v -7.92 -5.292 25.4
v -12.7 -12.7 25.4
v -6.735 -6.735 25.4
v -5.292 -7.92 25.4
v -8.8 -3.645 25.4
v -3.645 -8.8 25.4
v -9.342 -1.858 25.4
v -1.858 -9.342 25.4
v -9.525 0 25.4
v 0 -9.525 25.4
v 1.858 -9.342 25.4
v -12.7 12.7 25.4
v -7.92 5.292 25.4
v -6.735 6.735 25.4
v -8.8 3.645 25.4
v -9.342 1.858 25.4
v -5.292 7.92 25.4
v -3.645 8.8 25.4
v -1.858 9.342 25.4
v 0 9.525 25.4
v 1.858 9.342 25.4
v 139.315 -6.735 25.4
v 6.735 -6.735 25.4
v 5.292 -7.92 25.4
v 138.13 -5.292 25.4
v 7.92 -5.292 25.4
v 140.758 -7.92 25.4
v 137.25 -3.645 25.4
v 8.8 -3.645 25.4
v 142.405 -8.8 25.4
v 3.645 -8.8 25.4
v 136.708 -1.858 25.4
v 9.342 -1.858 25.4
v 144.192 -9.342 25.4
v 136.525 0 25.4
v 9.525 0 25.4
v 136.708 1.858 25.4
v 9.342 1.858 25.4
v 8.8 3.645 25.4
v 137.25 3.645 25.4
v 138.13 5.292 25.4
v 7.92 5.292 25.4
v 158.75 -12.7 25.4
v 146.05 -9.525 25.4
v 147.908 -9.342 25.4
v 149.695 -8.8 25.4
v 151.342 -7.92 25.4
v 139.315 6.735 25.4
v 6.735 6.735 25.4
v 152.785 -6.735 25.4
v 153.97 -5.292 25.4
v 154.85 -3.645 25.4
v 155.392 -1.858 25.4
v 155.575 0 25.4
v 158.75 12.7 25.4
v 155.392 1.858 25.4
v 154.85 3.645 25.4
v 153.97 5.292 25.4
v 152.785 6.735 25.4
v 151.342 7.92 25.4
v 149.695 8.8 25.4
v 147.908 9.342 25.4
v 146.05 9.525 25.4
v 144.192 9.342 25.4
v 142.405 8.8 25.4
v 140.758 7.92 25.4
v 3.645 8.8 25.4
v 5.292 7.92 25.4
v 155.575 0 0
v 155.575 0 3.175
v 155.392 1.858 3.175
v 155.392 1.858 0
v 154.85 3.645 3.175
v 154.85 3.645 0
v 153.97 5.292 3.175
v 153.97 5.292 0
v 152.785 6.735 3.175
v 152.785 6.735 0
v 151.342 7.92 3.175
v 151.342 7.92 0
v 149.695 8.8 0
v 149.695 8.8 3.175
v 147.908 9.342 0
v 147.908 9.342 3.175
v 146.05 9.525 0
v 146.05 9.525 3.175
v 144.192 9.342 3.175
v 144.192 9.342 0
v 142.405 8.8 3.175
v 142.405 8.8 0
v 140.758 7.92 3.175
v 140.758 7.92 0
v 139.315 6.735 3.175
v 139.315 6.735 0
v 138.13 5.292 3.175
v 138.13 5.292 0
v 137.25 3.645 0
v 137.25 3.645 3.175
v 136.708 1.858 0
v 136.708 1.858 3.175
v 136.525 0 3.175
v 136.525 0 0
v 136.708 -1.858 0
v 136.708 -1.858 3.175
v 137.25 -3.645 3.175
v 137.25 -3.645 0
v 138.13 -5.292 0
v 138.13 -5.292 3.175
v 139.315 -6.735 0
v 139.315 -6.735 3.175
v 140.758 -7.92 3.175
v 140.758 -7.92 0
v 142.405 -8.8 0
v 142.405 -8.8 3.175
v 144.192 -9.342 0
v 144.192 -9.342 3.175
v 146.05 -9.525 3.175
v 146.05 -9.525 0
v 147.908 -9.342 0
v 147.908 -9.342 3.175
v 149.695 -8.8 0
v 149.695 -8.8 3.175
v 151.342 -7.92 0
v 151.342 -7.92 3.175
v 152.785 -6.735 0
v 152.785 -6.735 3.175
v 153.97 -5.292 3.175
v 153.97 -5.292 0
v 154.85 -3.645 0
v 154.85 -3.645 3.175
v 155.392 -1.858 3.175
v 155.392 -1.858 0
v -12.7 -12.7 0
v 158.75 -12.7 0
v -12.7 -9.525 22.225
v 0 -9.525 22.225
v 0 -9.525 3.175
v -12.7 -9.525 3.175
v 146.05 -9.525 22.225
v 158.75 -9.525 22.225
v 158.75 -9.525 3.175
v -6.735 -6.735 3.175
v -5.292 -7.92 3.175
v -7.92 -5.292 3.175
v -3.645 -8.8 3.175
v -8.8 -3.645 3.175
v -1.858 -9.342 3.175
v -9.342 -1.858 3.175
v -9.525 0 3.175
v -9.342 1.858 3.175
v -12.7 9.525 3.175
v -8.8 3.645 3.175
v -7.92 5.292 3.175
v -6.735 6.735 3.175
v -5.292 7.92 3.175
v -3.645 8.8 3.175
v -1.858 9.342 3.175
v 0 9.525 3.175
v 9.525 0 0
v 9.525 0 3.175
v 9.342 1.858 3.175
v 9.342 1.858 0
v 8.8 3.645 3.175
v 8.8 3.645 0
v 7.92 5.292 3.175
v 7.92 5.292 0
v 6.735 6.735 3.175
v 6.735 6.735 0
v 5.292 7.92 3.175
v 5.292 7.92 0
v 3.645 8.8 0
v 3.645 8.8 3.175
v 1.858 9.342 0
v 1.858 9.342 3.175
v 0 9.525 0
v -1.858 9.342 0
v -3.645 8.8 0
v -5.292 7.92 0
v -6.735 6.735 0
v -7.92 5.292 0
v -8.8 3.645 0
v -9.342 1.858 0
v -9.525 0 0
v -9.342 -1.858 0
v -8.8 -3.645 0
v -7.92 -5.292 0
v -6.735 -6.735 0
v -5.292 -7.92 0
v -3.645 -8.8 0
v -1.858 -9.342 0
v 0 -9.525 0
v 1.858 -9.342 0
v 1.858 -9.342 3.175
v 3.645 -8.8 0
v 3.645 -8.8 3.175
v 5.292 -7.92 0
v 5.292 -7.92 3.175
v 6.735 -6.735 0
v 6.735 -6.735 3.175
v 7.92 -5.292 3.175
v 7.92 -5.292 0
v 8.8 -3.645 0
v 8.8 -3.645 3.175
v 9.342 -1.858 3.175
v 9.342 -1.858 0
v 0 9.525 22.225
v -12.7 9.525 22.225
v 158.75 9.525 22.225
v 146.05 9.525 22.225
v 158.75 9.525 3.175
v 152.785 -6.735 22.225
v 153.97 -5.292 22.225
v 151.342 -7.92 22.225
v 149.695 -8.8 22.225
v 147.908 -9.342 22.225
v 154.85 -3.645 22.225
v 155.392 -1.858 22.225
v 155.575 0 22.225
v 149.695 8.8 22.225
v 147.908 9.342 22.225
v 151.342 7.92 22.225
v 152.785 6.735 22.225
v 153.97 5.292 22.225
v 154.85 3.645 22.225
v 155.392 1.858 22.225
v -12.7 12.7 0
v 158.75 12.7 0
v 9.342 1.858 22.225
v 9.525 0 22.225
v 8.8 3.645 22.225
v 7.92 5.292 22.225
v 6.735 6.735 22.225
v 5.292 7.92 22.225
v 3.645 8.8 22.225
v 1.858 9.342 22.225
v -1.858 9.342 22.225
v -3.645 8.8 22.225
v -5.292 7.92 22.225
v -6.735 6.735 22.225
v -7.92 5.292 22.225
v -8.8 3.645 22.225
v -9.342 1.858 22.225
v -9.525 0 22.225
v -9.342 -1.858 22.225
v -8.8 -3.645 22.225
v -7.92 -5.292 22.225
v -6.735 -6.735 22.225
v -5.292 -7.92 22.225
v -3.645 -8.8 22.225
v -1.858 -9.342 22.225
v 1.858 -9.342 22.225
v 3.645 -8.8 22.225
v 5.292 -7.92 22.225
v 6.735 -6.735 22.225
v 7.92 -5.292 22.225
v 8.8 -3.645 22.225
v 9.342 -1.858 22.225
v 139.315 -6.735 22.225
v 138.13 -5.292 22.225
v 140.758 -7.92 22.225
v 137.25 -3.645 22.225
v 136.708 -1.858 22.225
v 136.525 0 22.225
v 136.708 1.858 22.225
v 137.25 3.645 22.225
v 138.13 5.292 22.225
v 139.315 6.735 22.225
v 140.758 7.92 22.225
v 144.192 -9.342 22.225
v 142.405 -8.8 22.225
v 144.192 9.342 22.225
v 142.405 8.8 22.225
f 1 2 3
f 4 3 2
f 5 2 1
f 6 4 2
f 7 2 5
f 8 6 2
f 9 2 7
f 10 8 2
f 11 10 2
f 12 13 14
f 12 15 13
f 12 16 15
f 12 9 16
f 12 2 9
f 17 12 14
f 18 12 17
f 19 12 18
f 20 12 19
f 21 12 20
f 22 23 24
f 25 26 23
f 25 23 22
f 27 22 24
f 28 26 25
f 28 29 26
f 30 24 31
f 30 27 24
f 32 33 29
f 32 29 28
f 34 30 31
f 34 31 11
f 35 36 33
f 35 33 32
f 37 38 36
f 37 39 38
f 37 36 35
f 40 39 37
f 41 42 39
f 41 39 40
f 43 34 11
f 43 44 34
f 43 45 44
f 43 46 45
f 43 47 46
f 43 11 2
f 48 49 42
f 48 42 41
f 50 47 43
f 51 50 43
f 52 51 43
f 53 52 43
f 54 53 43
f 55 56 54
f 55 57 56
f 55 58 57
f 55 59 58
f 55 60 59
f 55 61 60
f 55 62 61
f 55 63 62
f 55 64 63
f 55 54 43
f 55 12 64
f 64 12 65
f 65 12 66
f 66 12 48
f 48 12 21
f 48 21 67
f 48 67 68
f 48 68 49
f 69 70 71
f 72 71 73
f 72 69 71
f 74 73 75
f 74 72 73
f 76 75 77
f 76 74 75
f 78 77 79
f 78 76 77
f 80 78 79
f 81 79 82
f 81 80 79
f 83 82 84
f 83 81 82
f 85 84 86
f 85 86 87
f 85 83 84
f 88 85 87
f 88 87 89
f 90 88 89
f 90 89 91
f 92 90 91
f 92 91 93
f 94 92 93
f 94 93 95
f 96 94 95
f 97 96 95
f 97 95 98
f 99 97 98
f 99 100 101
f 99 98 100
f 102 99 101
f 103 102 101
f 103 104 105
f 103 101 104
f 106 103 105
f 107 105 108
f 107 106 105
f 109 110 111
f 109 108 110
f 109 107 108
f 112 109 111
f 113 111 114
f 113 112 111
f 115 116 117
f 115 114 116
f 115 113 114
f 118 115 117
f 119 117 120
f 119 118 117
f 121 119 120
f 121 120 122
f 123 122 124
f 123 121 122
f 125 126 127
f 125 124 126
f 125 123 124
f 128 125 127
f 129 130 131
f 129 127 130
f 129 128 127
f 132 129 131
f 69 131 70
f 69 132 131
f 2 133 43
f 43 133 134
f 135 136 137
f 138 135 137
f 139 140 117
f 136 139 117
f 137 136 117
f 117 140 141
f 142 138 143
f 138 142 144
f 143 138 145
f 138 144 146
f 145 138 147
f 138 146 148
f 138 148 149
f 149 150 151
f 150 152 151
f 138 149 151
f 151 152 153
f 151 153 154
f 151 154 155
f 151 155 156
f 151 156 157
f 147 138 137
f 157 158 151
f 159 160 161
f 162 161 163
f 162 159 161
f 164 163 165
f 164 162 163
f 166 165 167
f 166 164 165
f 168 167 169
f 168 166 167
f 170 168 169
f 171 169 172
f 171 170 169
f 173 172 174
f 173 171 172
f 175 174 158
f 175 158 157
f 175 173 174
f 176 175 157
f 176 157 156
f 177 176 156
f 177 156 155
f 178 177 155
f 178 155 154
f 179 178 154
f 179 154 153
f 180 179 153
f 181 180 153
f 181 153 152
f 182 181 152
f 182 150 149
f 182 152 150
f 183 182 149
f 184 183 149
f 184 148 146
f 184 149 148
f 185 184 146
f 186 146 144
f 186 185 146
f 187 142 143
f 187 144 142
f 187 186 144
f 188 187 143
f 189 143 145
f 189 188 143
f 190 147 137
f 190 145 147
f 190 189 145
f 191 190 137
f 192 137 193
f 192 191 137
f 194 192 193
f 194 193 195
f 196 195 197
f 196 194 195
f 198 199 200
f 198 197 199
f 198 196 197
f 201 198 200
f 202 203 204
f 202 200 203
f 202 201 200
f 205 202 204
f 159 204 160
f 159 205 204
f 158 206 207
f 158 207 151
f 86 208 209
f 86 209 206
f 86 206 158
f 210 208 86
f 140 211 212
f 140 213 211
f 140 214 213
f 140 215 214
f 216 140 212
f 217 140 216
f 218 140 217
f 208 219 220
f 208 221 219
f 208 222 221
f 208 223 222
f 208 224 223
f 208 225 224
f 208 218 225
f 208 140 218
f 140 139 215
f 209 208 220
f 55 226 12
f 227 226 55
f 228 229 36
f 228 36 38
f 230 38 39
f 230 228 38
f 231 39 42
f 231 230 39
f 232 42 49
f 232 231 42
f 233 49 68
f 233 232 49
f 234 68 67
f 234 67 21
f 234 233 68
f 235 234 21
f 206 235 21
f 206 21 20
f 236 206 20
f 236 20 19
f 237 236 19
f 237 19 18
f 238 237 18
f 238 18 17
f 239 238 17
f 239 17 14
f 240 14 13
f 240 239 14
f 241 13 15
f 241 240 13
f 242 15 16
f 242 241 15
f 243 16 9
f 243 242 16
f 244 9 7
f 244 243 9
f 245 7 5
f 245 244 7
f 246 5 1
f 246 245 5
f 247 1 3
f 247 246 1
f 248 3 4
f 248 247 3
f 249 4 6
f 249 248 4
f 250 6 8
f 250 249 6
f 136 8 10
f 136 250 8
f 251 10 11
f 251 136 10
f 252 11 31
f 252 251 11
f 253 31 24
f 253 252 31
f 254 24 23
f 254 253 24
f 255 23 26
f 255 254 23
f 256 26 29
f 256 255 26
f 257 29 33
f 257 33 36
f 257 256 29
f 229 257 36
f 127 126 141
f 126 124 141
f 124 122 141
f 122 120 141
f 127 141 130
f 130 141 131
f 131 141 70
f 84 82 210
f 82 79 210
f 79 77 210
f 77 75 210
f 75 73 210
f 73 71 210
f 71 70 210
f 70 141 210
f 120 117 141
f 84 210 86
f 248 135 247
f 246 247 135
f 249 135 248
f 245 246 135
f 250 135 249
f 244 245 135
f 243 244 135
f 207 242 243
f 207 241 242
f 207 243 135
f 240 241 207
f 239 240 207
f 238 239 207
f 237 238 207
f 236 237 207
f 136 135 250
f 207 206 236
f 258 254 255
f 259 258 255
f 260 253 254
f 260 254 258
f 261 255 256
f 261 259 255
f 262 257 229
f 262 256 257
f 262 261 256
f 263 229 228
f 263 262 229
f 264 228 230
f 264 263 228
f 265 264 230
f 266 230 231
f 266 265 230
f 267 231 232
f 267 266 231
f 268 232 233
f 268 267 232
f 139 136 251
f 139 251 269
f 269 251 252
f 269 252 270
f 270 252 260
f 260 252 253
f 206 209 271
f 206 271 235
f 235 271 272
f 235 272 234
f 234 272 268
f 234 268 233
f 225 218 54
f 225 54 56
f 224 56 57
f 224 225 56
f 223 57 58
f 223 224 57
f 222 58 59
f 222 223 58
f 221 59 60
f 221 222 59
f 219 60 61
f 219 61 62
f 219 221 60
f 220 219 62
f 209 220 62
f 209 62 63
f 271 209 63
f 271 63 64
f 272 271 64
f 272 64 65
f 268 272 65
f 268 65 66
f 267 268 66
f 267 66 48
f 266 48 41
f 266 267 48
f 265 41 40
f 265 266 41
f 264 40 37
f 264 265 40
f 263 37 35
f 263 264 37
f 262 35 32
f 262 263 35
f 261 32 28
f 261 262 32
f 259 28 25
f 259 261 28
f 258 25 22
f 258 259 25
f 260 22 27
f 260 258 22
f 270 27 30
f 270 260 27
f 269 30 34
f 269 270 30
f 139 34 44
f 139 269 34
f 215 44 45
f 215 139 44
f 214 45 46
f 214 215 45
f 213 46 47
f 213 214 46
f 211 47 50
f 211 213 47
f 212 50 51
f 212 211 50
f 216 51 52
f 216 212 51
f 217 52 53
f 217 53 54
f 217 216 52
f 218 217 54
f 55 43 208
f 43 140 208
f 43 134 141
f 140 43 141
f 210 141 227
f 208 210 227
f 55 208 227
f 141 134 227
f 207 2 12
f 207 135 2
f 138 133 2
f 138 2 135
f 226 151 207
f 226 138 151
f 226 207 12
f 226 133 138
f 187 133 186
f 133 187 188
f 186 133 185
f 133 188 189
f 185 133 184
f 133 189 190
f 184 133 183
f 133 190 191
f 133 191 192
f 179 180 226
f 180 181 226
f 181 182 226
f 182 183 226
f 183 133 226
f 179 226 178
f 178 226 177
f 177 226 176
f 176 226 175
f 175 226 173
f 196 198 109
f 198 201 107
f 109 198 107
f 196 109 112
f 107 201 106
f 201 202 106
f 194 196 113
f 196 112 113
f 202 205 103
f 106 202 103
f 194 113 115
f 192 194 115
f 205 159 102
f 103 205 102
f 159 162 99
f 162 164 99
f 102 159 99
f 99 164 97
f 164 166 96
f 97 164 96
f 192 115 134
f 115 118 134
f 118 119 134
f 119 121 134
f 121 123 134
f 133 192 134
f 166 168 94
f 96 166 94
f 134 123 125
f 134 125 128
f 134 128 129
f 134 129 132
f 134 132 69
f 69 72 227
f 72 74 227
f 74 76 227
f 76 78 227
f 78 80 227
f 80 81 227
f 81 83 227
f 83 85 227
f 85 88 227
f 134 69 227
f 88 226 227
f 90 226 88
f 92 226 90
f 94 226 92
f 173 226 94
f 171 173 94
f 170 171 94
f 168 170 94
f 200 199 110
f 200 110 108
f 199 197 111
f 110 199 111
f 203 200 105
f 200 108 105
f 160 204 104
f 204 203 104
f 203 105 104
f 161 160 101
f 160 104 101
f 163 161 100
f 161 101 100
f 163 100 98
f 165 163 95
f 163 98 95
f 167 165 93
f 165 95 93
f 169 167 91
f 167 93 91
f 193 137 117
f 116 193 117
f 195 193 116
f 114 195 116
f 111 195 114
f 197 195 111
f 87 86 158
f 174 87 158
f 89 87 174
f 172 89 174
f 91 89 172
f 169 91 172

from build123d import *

# Parameters (mm, degrees)
SKETCH1_W           = 171.45
SKETCH1_H           = 25.4
SKETCH1_R           = 9.525
BOSS_EXTRUDE1_DEPTH = 25.4
SKETCH2_W           = 19.05
SKETCH2_H           = 19.05
CUT_EXTRUDE1_DEPTH  = 174.785938729


with BuildPart() as part:
    # Sketch1 → Boss-Extrude1 (new body)
    with BuildSketch(Plane.XY):
        with Locations((73.025, 0)):
            Rectangle(SKETCH1_W, SKETCH1_H)
        Circle(SKETCH1_R, mode=Mode.SUBTRACT)
        with Locations((146.05, 0)):
            Circle(SKETCH1_R, mode=Mode.SUBTRACT)
    extrude(amount=BOSS_EXTRUDE1_DEPTH)

    # Sketch2 → Cut-Extrude1 (cut, through all)
    with BuildSketch(Plane(origin=(158.75, 0, 0), x_dir=(0, 0, -1), z_dir=(1, 0, 0))):
        with Locations((-12.7, 0)):
            Rectangle(SKETCH2_W, SKETCH2_H)
    extrude(amount=-CUT_EXTRUDE1_DEPTH, mode=Mode.SUBTRACT)


solid = part.part
